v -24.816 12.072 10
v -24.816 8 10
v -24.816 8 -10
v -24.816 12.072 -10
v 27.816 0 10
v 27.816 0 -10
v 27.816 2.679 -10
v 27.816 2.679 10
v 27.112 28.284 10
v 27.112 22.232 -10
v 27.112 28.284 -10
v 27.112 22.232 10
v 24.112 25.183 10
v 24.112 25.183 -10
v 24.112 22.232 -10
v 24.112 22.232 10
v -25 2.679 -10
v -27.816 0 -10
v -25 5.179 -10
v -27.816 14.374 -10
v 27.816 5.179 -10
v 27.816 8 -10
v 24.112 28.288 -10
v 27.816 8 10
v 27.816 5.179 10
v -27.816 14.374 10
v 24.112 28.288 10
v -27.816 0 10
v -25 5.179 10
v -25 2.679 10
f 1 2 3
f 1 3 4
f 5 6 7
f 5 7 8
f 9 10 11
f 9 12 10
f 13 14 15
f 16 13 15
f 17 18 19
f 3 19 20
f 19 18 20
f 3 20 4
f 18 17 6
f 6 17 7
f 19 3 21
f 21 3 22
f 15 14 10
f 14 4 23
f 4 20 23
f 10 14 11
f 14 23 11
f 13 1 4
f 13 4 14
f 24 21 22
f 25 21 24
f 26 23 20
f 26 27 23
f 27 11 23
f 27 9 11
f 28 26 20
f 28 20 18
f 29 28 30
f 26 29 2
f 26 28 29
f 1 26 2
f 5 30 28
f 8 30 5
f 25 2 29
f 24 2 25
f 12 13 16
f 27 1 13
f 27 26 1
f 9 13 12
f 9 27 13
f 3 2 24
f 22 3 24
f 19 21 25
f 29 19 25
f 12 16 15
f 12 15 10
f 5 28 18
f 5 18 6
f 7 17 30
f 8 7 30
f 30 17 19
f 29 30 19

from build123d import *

# Parameters (mm, degrees)
F0_W          = 55.6310900272
F0_H          = 20
F1_DEPTH      = 8
F2_W          = 2.5
F2_H          = 40
F3_DEPTH      = 27.8165450136
F3_DEPTH_BACK = 25
F5_DEPTH      = 10


# Not quite as in the source:
# - a feature names something its author has since deleted; it is built from what else it names


with BuildPart() as f1:
    # F0 (on Front) → F1 (new body)
    with BuildSketch(Plane.XZ):
        Rectangle(F0_W, F0_H)
    extrude(amount=-F1_DEPTH)

    # F2 (on Right) → F3 (cut, two sides)
    with BuildSketch(Plane.YZ) as f3_sk:
        with Locations((3.9288233686, 0)):
            Rectangle(F2_W, F2_H)
    extrude(amount=F3_DEPTH, mode=Mode.SUBTRACT)
    extrude(f3_sk.sketch, amount=-F3_DEPTH_BACK, mode=Mode.SUBTRACT)

    # F4 (on Top) → F5 (join, symmetric)
    with BuildSketch(Plane.XY):
        Polygon((24.1118337571, 28.2883709489), (-27.8155450136, 14.3744717422), (-27.8155450136, 8), (-24.8155450136, 8), (-24.8155450136, 12.0724907783), (24.1118337571, 25.1825424077), align=None)
        Polygon((27.1118309825, 28.2842907635), (24.1118337571, 28.2883709489), (24.1118337571, 25.1825424077), (24.1118337571, 22.2315117717), (27.1118309825, 22.2315117717), align=None)
    extrude(amount=F5_DEPTH, both=True)


solid = f1.part
